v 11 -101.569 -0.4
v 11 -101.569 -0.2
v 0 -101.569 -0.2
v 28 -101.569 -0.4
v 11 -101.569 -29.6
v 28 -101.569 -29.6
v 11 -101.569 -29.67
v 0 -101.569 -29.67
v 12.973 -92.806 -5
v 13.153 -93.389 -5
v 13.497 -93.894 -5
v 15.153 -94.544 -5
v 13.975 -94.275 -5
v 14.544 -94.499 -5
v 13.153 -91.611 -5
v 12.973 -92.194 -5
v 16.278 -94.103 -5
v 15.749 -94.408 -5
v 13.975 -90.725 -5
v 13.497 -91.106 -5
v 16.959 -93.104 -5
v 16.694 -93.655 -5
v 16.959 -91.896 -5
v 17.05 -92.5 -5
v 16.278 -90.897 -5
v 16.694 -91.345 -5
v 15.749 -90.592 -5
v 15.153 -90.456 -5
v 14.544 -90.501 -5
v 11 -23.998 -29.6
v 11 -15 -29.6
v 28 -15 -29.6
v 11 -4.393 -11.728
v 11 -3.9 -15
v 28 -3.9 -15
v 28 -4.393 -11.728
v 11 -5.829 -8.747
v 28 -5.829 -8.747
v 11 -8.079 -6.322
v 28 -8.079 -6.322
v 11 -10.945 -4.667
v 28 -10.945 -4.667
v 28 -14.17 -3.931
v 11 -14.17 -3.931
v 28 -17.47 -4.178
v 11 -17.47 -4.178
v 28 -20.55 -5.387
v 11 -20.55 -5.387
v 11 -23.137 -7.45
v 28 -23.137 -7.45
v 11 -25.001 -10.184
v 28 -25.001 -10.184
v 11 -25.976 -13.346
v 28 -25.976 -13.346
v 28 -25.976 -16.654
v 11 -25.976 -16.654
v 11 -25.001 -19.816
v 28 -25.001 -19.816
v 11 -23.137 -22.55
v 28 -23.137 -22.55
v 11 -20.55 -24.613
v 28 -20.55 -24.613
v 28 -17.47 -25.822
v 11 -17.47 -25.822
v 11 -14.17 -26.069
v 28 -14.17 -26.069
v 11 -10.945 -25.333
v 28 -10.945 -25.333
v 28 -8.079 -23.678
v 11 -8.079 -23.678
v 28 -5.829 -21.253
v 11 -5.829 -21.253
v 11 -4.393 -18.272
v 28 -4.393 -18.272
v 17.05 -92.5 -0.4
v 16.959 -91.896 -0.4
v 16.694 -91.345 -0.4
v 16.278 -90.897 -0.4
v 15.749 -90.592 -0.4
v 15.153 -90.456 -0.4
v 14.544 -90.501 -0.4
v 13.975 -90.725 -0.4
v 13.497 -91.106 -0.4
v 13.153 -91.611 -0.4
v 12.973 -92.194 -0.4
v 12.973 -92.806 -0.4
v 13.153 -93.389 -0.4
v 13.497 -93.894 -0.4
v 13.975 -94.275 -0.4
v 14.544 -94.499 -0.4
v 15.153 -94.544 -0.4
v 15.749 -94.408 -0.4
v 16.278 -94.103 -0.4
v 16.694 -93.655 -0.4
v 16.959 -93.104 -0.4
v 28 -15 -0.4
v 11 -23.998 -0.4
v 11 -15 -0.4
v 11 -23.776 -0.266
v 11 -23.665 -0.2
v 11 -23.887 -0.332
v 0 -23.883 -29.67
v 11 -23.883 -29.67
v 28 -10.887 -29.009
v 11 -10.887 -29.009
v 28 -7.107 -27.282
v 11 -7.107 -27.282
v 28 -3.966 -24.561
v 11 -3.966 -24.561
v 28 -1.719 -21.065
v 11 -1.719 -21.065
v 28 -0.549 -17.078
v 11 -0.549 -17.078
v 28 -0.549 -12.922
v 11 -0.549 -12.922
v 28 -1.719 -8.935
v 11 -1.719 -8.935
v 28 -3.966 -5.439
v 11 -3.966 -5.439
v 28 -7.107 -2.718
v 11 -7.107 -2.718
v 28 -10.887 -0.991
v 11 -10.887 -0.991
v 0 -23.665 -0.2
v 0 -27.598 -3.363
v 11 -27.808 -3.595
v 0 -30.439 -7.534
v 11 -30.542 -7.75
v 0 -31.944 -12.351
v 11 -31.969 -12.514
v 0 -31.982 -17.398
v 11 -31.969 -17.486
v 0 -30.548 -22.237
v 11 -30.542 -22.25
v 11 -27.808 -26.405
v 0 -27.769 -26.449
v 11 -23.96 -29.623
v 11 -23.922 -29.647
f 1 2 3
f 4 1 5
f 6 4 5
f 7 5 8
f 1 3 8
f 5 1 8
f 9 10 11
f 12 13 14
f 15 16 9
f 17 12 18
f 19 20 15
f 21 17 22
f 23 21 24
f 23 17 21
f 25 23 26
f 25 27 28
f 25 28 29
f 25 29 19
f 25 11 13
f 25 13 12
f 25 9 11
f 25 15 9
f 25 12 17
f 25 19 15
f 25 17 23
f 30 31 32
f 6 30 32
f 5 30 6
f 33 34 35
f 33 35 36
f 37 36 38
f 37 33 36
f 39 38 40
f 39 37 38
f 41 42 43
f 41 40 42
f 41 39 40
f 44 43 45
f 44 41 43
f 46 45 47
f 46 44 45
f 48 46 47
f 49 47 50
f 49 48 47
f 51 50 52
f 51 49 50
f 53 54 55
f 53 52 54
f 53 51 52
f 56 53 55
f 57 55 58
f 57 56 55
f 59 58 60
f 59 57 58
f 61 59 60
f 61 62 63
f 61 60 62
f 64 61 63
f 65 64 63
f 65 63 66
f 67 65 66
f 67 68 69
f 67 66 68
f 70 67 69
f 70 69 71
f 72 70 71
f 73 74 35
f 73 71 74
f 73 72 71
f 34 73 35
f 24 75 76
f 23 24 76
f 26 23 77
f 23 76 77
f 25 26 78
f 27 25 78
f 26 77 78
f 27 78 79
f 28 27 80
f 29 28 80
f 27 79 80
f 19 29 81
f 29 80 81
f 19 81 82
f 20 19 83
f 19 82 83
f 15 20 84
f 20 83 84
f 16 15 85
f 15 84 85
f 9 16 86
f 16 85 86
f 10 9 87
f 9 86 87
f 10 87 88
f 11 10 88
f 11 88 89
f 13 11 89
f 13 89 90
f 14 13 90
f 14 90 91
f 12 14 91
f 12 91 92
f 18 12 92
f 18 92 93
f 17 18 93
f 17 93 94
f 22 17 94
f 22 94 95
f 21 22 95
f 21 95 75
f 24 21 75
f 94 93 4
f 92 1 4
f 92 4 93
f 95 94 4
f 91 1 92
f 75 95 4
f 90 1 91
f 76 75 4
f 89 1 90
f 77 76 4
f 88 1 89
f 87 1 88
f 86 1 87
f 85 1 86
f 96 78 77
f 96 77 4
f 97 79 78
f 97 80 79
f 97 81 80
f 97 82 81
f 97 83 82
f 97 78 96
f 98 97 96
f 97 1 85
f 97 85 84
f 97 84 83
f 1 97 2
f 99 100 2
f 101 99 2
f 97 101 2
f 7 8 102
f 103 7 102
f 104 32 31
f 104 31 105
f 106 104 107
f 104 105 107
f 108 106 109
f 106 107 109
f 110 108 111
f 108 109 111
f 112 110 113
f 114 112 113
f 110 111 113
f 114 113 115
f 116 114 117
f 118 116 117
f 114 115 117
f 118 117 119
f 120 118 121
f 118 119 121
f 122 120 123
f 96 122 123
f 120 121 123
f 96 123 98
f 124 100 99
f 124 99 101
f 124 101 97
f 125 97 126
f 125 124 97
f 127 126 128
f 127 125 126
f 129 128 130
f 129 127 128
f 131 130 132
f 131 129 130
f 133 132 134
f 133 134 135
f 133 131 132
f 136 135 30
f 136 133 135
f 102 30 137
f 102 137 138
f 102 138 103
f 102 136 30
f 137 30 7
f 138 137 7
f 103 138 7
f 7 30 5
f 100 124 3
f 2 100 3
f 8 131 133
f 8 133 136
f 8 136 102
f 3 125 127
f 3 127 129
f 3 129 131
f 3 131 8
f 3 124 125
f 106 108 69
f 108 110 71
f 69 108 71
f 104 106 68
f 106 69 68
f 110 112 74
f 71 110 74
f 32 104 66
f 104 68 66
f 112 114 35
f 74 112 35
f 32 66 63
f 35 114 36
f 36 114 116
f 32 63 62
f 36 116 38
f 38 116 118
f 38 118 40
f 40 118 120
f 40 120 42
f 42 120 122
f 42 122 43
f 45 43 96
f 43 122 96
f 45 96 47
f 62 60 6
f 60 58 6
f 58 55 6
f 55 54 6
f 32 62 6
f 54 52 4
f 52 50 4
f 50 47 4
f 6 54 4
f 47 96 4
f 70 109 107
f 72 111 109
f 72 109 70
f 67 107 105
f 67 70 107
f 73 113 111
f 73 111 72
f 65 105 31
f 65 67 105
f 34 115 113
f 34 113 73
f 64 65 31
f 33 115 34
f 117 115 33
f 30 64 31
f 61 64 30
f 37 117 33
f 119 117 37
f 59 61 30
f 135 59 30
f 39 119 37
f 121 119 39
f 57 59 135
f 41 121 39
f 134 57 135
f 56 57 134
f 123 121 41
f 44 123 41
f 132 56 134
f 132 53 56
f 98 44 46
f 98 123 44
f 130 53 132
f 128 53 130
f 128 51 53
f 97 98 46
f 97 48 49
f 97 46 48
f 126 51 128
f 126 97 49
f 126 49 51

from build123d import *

# Parameters (mm, degrees)
PAD004_DEPTH    = 17
PAD005_DEPTH    = 11
SKETCH007_R     = 11.1
POCKET001_DEPTH = 35
SKETCH015_R     = 2.05
POCKET003_DEPTH = 5


with BuildPart() as part:
    # Sketch005 → Pad004 (new body)
    with BuildSketch(Plane.YZ.offset(11)):
        with BuildLine():
            Line((-15, -29.6), (-101.569351, -29.6))
            Line((-101.569351, -29.6), (-101.569351, -0.4))
            Line((-101.569351, -0.4), (-15, -0.4))
            ThreePointArc((-15, -29.6), (-0.4, -15), (-15, -0.4))
        make_face()
    extrude(amount=PAD004_DEPTH)

    # Sketch006 → Pad005 (join)
    with BuildSketch(Plane.YZ):
        with BuildLine():
            ThreePointArc((-23.665016, -0.2), (-32.149529, -14.872954), (-23.883333, -29.67))
            Line((-101.569351, -29.67), (-23.883333, -29.67))
            Line((-101.569351, -0.2), (-101.569351, -29.67))
            Line((-23.665016, -0.2), (-101.569351, -0.2))
        make_face()
    extrude(amount=PAD005_DEPTH)

    # Sketch007 → Pocket001 (cut)
    with BuildSketch(Plane.YZ):
        with Locations((-15, -15)):
            Circle(SKETCH007_R)
    extrude(amount=POCKET001_DEPTH, mode=Mode.SUBTRACT)

    # Sketch015 → Pocket003 (cut)
    with BuildSketch(Plane.XY):
        with Locations((15, -92.5)):
            Circle(SKETCH015_R)
    extrude(amount=-POCKET003_DEPTH, mode=Mode.SUBTRACT)


solid = part.part
